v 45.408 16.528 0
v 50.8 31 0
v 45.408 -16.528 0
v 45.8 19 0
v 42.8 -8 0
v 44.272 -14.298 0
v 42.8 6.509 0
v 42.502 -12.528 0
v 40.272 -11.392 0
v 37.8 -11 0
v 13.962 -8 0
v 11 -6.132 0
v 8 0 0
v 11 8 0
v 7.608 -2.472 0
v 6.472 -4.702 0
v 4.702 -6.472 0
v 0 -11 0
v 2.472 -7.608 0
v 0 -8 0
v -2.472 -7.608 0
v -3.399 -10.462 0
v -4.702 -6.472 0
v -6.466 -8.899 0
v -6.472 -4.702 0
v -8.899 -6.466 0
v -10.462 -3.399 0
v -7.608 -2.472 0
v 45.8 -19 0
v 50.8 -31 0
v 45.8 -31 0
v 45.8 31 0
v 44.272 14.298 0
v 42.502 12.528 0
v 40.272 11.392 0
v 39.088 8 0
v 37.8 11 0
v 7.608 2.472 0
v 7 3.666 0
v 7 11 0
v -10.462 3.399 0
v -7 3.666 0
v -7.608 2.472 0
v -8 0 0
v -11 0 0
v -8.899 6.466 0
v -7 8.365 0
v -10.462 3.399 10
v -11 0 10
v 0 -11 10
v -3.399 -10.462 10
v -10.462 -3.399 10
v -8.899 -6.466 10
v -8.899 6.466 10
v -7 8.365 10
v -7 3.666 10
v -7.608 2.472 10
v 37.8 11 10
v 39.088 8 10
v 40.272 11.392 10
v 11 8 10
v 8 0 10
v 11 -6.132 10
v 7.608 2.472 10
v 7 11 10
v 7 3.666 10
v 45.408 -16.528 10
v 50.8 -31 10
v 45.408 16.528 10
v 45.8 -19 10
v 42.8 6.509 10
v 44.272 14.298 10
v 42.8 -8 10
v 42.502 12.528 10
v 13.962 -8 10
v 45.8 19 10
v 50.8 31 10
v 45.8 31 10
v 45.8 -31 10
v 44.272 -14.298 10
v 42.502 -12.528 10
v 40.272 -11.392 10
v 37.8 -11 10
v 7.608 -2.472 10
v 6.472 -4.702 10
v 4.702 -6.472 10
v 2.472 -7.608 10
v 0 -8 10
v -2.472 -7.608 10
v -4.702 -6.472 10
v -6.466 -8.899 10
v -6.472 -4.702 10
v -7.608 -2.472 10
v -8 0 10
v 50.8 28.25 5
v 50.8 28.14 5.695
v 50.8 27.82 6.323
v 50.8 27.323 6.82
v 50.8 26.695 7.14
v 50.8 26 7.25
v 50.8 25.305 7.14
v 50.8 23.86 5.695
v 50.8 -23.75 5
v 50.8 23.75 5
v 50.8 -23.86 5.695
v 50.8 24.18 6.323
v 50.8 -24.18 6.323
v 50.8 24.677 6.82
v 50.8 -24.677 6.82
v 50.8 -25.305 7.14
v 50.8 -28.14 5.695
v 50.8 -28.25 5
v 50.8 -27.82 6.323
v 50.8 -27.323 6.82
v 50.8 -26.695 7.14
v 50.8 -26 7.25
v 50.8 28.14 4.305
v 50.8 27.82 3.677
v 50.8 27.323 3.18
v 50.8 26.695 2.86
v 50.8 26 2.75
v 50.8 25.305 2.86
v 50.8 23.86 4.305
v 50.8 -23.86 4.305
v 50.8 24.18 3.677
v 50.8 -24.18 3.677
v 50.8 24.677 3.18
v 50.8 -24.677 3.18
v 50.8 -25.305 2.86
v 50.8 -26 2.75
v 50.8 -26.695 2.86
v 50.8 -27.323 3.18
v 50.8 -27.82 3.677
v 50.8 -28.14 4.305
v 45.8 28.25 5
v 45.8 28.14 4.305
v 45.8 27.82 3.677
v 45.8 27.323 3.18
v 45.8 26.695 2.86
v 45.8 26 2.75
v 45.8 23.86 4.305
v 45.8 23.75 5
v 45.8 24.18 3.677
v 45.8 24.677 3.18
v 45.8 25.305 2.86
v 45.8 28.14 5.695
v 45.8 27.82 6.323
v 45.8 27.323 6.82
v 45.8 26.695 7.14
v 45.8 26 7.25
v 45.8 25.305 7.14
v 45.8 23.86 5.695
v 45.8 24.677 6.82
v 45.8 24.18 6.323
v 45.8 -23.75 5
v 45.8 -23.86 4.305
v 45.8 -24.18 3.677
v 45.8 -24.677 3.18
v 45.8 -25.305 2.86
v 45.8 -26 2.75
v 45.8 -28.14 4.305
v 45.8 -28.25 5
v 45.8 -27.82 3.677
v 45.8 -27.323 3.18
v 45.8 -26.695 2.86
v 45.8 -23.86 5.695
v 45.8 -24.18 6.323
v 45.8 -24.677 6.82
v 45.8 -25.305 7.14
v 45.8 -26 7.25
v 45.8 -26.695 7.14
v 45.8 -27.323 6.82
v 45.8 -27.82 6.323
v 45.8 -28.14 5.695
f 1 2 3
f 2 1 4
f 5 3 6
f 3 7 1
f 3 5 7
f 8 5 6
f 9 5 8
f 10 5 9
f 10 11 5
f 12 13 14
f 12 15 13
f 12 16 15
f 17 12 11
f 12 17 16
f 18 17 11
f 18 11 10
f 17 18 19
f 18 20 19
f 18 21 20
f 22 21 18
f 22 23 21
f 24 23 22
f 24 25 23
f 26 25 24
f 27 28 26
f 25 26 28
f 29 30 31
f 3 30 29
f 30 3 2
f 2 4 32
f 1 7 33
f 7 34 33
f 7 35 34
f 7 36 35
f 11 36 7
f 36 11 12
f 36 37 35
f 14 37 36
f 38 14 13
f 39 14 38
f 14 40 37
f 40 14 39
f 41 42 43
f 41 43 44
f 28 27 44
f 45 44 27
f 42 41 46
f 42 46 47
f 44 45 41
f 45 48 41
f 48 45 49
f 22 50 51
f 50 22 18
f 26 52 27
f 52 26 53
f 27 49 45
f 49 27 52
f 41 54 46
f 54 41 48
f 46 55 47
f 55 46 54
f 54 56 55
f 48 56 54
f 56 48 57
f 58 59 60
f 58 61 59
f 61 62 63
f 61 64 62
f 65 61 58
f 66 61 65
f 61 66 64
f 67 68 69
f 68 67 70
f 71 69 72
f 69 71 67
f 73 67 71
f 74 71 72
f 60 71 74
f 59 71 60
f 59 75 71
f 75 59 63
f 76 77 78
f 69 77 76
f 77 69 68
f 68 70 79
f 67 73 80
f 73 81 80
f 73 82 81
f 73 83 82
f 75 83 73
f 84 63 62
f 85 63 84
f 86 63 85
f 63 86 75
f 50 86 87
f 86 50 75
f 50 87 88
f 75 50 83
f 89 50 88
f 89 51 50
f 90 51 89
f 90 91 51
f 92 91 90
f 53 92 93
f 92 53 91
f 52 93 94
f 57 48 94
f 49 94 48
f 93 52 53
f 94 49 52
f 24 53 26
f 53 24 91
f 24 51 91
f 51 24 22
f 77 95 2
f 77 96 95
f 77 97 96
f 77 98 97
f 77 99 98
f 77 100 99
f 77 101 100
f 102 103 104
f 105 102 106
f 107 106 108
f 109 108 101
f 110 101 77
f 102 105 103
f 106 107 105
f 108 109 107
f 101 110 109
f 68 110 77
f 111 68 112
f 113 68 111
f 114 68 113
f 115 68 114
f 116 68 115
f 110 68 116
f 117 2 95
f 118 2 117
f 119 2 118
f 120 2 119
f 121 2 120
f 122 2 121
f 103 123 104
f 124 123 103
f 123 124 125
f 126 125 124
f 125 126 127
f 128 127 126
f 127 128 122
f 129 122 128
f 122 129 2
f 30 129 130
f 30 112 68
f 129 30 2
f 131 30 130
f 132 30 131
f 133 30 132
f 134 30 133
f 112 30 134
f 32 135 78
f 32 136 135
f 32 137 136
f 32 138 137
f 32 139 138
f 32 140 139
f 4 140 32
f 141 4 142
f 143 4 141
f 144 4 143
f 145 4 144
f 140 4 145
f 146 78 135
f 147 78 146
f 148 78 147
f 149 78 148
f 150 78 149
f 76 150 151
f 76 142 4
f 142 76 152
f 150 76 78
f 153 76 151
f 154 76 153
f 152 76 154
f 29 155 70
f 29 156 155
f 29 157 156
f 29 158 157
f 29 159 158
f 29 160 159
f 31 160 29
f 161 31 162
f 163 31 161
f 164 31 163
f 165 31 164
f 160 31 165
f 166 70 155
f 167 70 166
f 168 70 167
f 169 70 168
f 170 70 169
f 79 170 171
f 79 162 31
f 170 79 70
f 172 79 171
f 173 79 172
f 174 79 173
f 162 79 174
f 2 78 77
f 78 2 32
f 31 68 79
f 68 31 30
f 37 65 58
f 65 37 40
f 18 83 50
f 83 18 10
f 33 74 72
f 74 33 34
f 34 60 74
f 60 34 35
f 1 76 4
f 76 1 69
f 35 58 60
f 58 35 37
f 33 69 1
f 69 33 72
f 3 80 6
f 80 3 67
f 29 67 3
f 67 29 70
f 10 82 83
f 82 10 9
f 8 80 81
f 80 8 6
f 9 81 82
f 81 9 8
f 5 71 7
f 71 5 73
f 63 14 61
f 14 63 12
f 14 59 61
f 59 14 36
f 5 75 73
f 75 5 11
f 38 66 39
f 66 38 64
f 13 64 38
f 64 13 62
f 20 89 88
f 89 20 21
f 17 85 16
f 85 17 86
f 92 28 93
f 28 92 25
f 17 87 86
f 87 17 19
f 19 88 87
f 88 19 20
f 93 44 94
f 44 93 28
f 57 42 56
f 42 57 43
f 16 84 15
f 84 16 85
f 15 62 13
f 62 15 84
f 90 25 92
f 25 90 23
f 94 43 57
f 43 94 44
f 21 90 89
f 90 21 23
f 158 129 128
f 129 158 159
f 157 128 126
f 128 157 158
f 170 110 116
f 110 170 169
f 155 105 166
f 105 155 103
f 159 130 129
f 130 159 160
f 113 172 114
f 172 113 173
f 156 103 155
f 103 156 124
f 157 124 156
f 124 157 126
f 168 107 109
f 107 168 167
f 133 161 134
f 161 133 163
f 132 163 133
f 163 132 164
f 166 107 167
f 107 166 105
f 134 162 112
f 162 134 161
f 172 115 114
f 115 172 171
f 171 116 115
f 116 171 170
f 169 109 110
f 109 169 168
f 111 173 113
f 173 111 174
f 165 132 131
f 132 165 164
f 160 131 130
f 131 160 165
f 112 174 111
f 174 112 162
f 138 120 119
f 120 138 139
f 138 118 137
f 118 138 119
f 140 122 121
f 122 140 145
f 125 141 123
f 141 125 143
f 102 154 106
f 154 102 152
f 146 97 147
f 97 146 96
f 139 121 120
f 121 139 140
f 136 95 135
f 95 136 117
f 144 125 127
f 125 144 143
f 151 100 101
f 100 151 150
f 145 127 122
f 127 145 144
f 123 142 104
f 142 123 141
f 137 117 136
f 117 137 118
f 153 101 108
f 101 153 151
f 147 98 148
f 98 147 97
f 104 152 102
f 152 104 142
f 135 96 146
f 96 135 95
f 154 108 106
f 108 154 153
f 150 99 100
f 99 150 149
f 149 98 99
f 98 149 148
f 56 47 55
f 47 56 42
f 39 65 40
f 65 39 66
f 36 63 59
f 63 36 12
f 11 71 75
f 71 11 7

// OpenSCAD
// Pipe hanger 
//John Finch 2-6-14


//User Inputs
inner_dia=16; 		//large inner hole
wall=3;  			//wall thickness of loop
tab_length=20; 		//mounting tab length
tab_thickness=5;		//mounting tab thickness
clip_width=10; 		//height of loop along Z axis
mount_hole_dia=4.5;	//screw hole diameter
opening=1;			//1 for a gap in loop, 0 for a solid loop
opening_width=14;	//opening width if enabled
center_to_wall_dist = 50.8; //Distance from center of support to wall
fillet_radius = 8;  //radius of fillet where support meets wall tabs


//end of user inputs
lightening_length = center_to_wall_dist - inner_dia/2-2*wall-tab_thickness;
lightening_width = inner_dia;
lightening_angle = atan(lightening_width/lightening_length);
cross_length = sqrt(lightening_length*lightening_length+lightening_width*lightening_width);

fn=20;


difference(){

	union(){
  	//place outer ring
	cylinder(h=clip_width,r1=inner_dia/2+wall,r2=inner_dia/2+wall,$fn=fn);

	//place mounting tabs
	translate([center_to_wall_dist-tab_thickness,-(inner_dia+2*wall+2*tab_length)/2,0])
	cube([tab_thickness,inner_dia+2*wall+2*tab_length,clip_width]);

	//place lower cube
	translate([0,-inner_dia/2-wall,0])
	cube([center_to_wall_dist,inner_dia+2*wall,clip_width]);

	//Place fillet cubes
	translate ([center_to_wall_dist-tab_thickness-fillet_radius,inner_dia/2+wall,0])
	cube([fillet_radius,fillet_radius,clip_width]);
	
	translate ([center_to_wall_dist-tab_thickness-fillet_radius,-inner_dia/2-wall-fillet_radius,0])
	cube([fillet_radius,fillet_radius,clip_width]);

	}

//cut fillet radai
translate ([center_to_wall_dist-tab_thickness-fillet_radius,inner_dia/2+wall+fillet_radius,0])
cylinder(h=clip_width,r1=fillet_radius, r2=fillet_radius,$fn=fn);

translate ([center_to_wall_dist-tab_thickness-fillet_radius,-inner_dia/2-wall-fillet_radius,0])
cylinder(h=clip_width,r1=fillet_radius, r2=fillet_radius,$fn=fn);

//Cut major lighting rectangle
translate([inner_dia/2+wall,-inner_dia/2,0])

cube([center_to_wall_dist - inner_dia/2-2*wall-tab_thickness,inner_dia,clip_width]);


//cut inner hole
cylinder(h=clip_width,r1=inner_dia/2,r2=inner_dia/2,$fn=fn);

//cut hole in mounting tab 1
translate([center_to_wall_dist-tab_thickness*1.01,-(inner_dia/2+wall+tab_length*3/4),clip_width/2])
rotate([0,90,0])
cylinder(h=tab_thickness*1.05,r1=mount_hole_dia/2,r2=mount_hole_dia/2,$fn=fn);

//cut hole in mounting tab 2
translate([center_to_wall_dist-tab_thickness*1.01,(inner_dia/2+wall+tab_length*3/4),clip_width/2])
rotate([0,90,0])
cylinder(h=tab_thickness*1.05,r1=mount_hole_dia/2,r2=mount_hole_dia/2,$fn=fn);

//slice ring
rotate([0,0,-90])
if (opening == 1)
	{
	translate([-(inner_dia/2+wall),-opening_width/2,0])
	cube([inner_dia/2,opening_width,clip_width]);
	}
}

//add strengthening bars to lightning hole
translate([inner_dia/2,-inner_dia/2-wall,0])
rotate([0,0,lightening_angle])
cube([cross_length+2*wall,wall,clip_width]);
